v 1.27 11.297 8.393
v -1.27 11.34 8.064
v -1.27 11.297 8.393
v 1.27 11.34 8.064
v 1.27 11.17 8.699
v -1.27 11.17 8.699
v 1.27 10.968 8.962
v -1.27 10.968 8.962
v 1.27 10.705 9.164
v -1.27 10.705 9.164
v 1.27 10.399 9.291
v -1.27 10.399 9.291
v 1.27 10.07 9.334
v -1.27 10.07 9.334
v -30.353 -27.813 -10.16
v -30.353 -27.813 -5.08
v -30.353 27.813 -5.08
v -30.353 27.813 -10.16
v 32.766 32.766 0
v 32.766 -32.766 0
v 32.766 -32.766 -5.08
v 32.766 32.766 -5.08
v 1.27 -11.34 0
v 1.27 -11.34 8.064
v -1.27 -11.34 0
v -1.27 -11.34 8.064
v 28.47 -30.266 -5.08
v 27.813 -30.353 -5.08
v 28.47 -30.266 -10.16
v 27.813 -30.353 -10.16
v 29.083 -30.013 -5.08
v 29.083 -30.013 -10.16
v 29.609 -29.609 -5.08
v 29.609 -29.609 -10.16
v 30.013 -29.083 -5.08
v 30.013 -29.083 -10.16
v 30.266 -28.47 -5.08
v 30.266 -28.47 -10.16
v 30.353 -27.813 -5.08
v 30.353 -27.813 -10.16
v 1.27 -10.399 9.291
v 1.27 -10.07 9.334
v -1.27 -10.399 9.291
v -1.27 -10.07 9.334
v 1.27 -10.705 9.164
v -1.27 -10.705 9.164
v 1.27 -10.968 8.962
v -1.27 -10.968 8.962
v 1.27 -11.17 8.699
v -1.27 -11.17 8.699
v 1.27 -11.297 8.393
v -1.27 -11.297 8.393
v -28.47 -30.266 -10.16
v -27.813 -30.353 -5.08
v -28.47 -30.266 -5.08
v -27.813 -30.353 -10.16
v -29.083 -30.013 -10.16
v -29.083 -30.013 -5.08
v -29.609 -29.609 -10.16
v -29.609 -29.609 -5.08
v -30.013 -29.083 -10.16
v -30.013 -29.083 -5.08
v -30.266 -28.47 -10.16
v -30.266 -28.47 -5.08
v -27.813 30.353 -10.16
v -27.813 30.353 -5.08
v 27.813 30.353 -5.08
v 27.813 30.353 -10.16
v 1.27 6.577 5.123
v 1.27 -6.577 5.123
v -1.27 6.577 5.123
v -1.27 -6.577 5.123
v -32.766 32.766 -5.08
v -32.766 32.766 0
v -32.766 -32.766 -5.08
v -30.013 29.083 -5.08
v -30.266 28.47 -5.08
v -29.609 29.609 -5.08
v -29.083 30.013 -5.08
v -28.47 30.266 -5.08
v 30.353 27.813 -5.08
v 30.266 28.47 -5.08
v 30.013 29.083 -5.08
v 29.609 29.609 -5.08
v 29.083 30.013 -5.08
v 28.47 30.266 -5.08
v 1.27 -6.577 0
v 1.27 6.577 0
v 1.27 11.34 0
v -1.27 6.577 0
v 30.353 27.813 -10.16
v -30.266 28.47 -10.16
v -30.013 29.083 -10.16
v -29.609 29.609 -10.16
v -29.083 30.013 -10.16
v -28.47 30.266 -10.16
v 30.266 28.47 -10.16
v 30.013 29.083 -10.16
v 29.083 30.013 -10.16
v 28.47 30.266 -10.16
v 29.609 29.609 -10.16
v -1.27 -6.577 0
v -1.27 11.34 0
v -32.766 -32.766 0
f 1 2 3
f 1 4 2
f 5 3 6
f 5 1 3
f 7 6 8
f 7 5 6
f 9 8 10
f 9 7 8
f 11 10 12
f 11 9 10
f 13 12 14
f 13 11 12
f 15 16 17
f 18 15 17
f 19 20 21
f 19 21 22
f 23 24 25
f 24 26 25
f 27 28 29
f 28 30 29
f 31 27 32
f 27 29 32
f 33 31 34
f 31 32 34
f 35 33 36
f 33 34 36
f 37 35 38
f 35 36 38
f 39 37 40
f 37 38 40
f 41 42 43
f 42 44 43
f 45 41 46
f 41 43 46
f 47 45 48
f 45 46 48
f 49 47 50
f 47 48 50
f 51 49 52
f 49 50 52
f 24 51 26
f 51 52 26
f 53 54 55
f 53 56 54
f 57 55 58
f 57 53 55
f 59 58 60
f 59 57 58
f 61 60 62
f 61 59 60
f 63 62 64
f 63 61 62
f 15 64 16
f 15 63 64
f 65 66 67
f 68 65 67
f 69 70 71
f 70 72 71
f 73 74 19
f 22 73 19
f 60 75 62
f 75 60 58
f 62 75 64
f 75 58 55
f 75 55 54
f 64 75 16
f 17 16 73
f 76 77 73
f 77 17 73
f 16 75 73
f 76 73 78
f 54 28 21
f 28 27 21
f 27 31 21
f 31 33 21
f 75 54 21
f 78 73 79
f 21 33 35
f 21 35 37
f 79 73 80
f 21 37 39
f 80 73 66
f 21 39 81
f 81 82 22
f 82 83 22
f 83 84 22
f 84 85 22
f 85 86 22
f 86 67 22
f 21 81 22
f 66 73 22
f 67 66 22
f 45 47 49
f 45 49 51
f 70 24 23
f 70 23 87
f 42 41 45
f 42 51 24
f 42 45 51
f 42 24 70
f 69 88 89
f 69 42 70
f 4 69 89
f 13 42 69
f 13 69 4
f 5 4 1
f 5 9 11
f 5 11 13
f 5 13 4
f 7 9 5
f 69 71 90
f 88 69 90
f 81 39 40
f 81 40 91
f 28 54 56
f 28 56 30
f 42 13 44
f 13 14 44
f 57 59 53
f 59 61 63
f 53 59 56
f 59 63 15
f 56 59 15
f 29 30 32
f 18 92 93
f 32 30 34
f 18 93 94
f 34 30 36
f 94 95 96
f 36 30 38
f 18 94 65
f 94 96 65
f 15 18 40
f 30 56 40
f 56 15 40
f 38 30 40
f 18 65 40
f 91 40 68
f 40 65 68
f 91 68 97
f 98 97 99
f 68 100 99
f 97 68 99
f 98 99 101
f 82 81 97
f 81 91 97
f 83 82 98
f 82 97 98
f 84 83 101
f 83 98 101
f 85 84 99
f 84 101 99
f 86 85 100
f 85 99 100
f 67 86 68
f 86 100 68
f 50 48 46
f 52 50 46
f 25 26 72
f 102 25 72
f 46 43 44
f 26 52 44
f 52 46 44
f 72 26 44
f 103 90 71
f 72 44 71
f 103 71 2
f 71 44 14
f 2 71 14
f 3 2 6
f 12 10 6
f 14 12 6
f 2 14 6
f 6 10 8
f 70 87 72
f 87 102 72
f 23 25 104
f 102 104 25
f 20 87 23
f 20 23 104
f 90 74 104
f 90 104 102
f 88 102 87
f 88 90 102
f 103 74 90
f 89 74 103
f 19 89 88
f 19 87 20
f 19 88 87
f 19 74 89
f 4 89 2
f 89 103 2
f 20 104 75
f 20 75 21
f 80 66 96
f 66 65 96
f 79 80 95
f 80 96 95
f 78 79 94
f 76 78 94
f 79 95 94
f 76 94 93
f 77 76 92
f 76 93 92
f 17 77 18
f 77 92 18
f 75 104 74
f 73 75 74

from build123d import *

# Parameters (mm, degrees)
F0_W     = 65.532
F0_H     = 65.532
F1_DEPTH = 5.08
F2_W     = 60.706
F2_H     = 60.706
F3_DEPTH = 10.16
F4_R     = 2.54
F6_DEPTH = 1.27
F8_R     = 1.27


with BuildPart() as f1:
    # F0 (on Top) → F1 (new body)
    with BuildSketch(Plane.XY):
        Rectangle(F0_W, F0_H)
    extrude(amount=-F1_DEPTH)

    # F2 (on Top) → F3 (join)
    with BuildSketch(Plane.XY):
        Rectangle(F2_W, F2_H)
    extrude(amount=-F3_DEPTH)

    # F4
    f4_edges = [f1.edges().sort_by_distance(p)[0] for p in [
        (-30.353, 30.353, -7.62),
        (30.353, 30.353, -7.62),
        (30.353, -30.353, -7.62),
        (-30.353, -30.353, -7.62),
    ]]
    fillet(f4_edges, radius=F4_R)

    # F5 (on Right) → F6 (join)
    with BuildSketch(Plane.YZ):
        Polygon((-11.3400844857, 9.3340231106), (-11.3400844857, 0), (-6.5773450769, 0), (-6.5773450769, 5.1228902303), (0, 5.1228902303), (0, 9.3340231106), align=None)
        Polygon((11.3400844857, 9.3340231106), (0, 9.3340231106), (0, 5.1228902303), (6.5773450769, 5.1228902303), (6.5773450769, 0), (11.3400844857, 0), align=None)
    extrude(amount=F6_DEPTH)

    # F7: F1 across plane


with BuildPart() as f1_1:
    add(f1.part)
    add(f1.part.mirror(Plane.YZ))

    # F8
    f8_edges = [f1_1.edges().sort_by_distance(p)[0] for p in [
        (0, -11.340084, 9.334023),
        (0, 11.340084, 9.334023),
    ]]
    fillet(f8_edges, radius=F8_R)


solid = f1_1.part
